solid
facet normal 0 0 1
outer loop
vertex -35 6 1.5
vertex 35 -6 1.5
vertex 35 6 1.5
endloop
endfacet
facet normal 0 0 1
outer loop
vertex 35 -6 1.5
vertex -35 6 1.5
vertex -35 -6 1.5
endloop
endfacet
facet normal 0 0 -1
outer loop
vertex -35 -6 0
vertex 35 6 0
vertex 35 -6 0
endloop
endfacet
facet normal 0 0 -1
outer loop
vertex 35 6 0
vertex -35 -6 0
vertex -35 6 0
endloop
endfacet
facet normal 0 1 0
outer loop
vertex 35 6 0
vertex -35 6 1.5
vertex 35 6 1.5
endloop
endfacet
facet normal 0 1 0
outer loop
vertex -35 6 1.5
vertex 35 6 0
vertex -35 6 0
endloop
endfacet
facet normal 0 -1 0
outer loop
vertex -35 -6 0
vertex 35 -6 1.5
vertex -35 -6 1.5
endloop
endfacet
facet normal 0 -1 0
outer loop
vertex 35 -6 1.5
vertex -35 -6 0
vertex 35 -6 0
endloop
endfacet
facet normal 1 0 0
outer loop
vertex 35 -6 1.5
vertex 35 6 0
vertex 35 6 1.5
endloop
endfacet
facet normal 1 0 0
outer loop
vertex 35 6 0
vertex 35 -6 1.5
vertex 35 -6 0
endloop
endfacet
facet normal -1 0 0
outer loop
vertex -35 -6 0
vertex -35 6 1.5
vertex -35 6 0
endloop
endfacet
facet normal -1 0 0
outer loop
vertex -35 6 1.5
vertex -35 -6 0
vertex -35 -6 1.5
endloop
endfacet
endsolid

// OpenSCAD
$fn = 64; // resolution for cylinders and circles

// Dimensions (mm)
thickness = 1.5;          // Z
spine_length = 70;        // X
spine_width = 12;         // Y
tooth_width = 5;          // X
tooth_length = 12;       // Y
gap = 1.5;                // Y
num_teeth = 10;           // number of teeth

// Derived dimensions
spine_end_offset = (spine_length - (num_teeth*tooth_width + (num_teeth-1)*gap)) / 2; // 3.25 mm
tooth_start_x = -spine_length/2 + spine_end_offset; // left edge of first tooth

// Build comb
union() {
    // Spine
    translate([ -spine_length/2, -spine_width/2, 0]) cube([spine_length, spine_width, thickness]);

    // Teeth
    for (i = [0:num_teeth-1]) {
        x = tooth_start_x + i*(tooth_width + gap);
        translate([x, -spine_width/2, 0]) cube([tooth_width, tooth_length, thickness]);
    }
}
